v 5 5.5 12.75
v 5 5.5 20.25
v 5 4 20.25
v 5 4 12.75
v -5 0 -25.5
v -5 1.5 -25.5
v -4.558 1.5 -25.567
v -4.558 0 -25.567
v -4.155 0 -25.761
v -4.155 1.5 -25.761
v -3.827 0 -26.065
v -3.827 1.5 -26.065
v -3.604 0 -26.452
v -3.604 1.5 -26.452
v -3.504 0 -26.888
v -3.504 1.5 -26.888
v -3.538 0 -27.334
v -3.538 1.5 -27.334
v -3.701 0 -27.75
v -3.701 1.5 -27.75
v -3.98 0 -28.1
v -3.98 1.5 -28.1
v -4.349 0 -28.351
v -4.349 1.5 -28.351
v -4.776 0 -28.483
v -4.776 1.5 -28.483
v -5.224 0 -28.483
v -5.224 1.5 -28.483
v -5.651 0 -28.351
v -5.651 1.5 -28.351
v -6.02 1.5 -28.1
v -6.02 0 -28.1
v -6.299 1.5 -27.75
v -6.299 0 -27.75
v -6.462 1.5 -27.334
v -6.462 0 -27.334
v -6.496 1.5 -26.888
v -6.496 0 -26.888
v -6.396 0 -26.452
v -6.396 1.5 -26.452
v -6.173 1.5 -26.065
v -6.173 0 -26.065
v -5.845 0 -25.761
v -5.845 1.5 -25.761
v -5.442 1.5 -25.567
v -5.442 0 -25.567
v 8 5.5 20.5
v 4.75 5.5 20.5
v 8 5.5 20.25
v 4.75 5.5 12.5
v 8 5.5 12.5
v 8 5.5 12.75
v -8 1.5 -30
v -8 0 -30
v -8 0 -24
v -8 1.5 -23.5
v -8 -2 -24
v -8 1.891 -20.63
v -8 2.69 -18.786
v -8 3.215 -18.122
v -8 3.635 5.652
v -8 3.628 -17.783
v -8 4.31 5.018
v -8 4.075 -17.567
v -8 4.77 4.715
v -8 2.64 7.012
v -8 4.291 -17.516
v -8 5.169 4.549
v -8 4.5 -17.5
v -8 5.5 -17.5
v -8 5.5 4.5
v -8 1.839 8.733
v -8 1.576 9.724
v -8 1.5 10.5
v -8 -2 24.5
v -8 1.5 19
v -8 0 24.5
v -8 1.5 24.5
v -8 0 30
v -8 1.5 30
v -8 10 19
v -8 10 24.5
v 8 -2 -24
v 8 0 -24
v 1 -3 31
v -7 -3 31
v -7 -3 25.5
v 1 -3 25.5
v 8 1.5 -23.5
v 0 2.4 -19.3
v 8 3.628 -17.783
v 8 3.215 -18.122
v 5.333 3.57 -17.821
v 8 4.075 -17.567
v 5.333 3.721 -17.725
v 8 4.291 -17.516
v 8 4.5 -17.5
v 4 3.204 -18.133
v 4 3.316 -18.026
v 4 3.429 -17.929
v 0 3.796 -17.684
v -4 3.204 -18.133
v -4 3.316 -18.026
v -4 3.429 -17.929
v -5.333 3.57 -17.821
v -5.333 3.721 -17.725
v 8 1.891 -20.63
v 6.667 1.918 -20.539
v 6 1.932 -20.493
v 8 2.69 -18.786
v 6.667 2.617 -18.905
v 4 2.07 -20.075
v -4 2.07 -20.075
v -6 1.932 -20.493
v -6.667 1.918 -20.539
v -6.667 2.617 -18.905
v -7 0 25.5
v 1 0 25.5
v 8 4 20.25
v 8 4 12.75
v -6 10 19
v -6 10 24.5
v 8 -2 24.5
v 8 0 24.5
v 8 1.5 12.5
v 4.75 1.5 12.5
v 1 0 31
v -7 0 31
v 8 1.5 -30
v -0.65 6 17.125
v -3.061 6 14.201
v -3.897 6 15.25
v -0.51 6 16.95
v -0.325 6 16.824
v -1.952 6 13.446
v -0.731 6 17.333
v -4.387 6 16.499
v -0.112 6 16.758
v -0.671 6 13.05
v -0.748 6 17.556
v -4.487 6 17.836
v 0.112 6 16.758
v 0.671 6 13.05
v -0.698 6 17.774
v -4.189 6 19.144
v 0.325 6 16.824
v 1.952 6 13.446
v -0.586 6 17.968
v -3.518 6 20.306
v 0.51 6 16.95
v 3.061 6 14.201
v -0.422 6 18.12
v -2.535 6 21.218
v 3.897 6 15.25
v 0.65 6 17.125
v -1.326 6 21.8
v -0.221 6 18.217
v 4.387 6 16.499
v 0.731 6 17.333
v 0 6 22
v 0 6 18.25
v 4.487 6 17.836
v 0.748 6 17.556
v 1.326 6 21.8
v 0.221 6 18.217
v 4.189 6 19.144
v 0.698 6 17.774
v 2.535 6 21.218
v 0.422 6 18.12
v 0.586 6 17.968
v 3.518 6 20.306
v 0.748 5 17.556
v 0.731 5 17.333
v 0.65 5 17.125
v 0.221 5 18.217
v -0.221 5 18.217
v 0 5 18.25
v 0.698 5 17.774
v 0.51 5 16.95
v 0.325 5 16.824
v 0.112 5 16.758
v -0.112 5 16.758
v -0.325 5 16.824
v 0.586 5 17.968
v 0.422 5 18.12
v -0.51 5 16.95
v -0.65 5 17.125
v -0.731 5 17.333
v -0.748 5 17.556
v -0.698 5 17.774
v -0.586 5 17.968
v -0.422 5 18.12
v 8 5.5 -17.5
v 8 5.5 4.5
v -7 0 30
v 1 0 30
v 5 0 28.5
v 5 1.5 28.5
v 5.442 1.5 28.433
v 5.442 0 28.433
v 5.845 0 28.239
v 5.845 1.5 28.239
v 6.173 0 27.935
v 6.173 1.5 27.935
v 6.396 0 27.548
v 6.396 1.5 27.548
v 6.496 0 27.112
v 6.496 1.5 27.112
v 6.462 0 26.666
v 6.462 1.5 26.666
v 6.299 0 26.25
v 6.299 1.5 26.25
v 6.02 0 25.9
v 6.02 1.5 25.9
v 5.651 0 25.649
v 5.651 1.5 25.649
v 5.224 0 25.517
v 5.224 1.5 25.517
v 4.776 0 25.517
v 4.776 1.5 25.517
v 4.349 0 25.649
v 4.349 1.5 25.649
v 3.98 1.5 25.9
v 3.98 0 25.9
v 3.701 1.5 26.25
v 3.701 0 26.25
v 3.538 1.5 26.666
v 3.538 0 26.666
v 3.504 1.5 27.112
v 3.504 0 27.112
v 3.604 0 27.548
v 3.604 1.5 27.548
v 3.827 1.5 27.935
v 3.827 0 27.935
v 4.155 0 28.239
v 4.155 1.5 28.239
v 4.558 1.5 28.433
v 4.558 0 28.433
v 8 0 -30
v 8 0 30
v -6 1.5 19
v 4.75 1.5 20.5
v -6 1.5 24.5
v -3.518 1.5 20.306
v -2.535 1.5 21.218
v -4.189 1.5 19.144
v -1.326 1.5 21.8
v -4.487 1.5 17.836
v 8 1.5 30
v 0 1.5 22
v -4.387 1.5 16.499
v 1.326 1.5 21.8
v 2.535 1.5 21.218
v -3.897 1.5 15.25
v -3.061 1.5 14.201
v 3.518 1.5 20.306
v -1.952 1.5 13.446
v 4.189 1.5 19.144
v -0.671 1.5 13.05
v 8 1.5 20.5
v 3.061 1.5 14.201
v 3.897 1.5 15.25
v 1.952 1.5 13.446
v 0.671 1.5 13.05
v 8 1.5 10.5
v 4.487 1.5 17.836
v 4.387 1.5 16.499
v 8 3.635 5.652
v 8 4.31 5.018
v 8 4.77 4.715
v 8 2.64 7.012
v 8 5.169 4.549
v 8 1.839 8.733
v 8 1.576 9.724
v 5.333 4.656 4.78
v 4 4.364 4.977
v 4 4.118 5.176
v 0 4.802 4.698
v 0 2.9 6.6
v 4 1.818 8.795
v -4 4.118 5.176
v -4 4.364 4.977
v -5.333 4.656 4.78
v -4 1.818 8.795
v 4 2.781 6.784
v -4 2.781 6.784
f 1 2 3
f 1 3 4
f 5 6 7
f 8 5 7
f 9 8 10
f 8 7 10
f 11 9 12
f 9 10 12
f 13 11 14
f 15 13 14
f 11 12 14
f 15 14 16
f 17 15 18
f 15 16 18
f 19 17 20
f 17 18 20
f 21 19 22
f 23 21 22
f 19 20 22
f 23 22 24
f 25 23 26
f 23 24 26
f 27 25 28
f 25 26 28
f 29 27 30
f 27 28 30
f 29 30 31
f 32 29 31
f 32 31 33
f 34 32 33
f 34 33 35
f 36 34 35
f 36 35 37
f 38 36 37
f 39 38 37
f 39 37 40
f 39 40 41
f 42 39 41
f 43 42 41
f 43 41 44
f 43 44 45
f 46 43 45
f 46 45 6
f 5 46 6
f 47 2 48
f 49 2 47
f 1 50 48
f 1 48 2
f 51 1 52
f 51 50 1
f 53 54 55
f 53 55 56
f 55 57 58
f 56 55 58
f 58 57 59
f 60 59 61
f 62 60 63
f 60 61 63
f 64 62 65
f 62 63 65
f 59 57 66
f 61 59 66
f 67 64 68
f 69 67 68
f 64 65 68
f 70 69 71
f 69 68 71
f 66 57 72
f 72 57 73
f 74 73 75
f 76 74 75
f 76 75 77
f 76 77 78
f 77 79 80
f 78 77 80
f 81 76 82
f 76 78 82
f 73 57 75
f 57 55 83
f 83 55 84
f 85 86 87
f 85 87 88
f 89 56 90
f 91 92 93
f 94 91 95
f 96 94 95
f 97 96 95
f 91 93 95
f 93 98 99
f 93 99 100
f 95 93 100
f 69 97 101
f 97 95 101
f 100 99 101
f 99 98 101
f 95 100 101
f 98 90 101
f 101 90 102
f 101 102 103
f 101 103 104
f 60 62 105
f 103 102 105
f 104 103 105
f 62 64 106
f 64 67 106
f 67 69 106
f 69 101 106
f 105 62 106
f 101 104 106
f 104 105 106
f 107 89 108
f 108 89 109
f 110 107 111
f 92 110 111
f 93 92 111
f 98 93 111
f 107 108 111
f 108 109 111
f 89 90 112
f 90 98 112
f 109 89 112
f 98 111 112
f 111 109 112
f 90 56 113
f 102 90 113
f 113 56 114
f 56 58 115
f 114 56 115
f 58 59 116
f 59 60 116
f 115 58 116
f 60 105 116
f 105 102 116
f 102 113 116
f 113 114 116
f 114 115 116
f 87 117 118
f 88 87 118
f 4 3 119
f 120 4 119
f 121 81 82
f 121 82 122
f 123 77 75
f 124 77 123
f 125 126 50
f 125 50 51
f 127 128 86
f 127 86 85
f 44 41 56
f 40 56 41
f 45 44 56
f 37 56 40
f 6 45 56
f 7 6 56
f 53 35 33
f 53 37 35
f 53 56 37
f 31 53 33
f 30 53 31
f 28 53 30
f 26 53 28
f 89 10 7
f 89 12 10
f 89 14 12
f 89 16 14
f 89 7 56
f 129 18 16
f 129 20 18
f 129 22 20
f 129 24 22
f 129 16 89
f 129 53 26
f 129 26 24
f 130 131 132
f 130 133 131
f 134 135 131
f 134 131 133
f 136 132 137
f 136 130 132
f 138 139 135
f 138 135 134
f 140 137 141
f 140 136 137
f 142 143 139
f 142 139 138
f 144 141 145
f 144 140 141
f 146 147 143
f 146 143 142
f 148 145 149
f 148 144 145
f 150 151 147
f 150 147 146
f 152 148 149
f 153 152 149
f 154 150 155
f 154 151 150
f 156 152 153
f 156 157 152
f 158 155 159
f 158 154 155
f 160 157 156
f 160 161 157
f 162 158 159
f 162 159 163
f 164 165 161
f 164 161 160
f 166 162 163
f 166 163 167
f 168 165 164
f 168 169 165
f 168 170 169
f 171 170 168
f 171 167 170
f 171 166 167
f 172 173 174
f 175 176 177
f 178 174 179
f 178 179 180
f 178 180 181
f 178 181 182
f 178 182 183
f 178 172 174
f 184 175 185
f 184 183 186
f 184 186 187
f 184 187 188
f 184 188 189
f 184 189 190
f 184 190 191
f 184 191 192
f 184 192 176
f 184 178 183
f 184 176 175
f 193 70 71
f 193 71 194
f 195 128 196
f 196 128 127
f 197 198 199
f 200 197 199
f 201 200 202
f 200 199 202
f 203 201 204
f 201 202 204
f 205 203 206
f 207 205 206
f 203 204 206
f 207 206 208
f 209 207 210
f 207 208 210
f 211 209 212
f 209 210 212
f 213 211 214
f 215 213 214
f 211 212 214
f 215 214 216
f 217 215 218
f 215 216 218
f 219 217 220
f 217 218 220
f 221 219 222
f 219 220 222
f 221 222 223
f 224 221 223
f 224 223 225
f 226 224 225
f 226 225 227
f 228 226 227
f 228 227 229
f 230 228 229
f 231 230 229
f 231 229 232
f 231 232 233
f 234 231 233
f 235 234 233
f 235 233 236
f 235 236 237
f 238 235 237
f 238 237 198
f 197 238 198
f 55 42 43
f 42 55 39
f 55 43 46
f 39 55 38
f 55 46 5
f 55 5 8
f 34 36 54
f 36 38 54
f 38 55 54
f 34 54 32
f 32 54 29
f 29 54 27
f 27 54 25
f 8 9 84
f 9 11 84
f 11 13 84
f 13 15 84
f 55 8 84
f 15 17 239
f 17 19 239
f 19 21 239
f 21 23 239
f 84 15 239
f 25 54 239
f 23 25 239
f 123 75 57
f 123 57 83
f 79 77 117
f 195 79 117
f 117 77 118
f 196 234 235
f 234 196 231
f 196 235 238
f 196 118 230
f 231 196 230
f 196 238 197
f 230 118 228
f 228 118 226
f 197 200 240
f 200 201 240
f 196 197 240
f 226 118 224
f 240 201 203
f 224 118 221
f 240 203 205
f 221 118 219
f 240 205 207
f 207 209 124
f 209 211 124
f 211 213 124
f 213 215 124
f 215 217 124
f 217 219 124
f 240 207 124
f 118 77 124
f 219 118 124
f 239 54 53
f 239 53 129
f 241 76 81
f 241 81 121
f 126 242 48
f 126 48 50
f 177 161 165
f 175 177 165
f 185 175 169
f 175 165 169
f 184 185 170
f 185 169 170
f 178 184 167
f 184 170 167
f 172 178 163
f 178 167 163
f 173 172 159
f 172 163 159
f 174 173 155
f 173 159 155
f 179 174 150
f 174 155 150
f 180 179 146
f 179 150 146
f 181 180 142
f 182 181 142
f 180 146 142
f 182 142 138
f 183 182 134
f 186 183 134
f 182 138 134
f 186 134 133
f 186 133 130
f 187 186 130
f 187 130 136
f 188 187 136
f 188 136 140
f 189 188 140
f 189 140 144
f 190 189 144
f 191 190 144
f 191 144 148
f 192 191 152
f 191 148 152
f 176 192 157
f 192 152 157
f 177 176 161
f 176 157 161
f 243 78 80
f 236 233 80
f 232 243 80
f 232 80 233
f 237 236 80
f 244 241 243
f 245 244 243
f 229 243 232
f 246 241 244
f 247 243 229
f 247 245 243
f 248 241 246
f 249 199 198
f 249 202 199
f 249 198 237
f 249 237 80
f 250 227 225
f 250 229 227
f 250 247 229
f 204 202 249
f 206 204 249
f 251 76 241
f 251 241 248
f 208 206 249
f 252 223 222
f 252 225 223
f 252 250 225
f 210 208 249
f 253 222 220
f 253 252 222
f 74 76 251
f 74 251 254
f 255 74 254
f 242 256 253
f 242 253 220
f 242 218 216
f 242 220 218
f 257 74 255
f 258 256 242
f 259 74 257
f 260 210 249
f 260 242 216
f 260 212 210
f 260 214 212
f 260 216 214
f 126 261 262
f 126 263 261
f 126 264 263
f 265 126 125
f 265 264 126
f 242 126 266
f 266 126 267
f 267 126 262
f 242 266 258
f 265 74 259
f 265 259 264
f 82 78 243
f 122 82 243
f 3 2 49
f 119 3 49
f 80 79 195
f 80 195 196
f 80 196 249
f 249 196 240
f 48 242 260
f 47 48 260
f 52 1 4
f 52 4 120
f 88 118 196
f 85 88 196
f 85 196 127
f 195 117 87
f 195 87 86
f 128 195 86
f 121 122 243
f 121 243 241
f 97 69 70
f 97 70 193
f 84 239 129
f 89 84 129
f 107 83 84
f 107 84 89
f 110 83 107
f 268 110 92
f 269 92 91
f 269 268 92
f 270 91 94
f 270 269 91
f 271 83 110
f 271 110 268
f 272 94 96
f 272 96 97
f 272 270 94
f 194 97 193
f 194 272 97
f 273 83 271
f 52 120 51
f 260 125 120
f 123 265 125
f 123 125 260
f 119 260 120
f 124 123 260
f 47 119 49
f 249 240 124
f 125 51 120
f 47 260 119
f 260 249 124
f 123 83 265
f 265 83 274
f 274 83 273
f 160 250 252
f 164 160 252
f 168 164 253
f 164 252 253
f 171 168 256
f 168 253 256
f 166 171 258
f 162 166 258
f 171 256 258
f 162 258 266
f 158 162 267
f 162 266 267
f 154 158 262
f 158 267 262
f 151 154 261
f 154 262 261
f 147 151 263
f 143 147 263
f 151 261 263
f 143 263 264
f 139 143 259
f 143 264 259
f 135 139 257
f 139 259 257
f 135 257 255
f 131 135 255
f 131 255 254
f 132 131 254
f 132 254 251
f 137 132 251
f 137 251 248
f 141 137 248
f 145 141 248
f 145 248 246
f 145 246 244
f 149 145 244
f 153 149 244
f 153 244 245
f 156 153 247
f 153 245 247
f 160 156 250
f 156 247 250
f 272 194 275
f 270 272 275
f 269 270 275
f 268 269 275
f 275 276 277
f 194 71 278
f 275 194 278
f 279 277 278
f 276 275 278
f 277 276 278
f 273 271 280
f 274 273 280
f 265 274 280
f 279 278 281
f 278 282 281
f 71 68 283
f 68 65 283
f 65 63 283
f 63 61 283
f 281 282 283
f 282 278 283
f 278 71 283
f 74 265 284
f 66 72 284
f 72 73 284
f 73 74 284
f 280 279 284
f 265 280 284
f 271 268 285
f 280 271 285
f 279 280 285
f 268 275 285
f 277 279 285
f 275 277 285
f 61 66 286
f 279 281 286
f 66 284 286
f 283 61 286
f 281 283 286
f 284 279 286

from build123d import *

# Parameters (mm, degrees)
SKETCH1_W           = 16
SKETCH1_H           = 60
BOSS_EXTRUDE1_DEPTH = 1.5
SKETCH5_R           = 1.5
CUT_EXTRUDE1_DEPTH  = 32.084562085
SKETCH8_W           = 16
SKETCH8_H           = 22
BOSS_EXTRUDE2_DEPTH = 4
FILLET1_START       = -8
FILLET1_DEPTH       = 16
FILLET2_START       = -8
FILLET2_DEPTH       = 16
SKETCH12_W          = 3.25
SKETCH12_H          = 8
BOSS_EXTRUDE5_DEPTH = 4
SKETCH15_R          = 4.5
BOSS_EXTRUDE6_DEPTH = 4.5
SKETCH16_W          = 3
SKETCH16_H          = 7.5
CUT_EXTRUDE2_DEPTH  = 1.5
SKETCH17_R          = 0.75
CUT_EXTRUDE3_DEPTH  = 1
SKETCH18_W          = 2
SKETCH18_H          = 5.5
BOSS_EXTRUDE7_DEPTH = 8.5
SKETCH22_W          = 8
SKETCH22_H          = 5.5
BOSS_EXTRUDE8_DEPTH = 3
SKETCH23_W          = 16
SKETCH23_H          = 48.5
BOSS_EXTRUDE9_DEPTH = 2


with BuildPart() as part:
    # Sketch1 → Boss-Extrude1 (new body)
    with BuildSketch(Plane(origin=(0, 0, 0), x_dir=(1, 0, 0), z_dir=(0, 1, 0))):
        Rectangle(SKETCH1_W, SKETCH1_H)
    extrude(amount=BOSS_EXTRUDE1_DEPTH)

    # Sketch5 → Cut-Extrude1 (cut, through all)
    with BuildSketch(Plane(origin=(0, 1.5, 0), x_dir=(1, 0, 0), z_dir=(0, 1, 0))):
        with Locations(Location((-5, 27, 0), (0, 0, 270))):
            Circle(SKETCH5_R)
        with Locations(Location((5, -27, 0), (0, 0, 270))):
            Circle(SKETCH5_R)
    extrude(amount=-CUT_EXTRUDE1_DEPTH, mode=Mode.SUBTRACT)

    # Sketch8 → Boss-Extrude2 (add)
    with BuildSketch(Plane(origin=(0, 1.5, 0), x_dir=(1, 0, 0), z_dir=(0, 1, 0))):
        with Locations((0, 6.5)):
            Rectangle(SKETCH8_W, SKETCH8_H)
    extrude(amount=BOSS_EXTRUDE2_DEPTH)

    # Fillet1: read off the stored shape, not the designer's step
    # Fillet1 outline → Fillet1 (add)
    with BuildSketch(Plane.YZ.offset(FILLET1_START)):
        with BuildLine():
            Line((1.5, -17.5), (1.5, -23.5))
            add(Edge.make_bspline(
                [(1.5, -23.5), (1.5, -17.5), (4.5, -17.5)],
                knots=[0, 0, 0, 1, 1, 1], degree=2, weights=[1, 0.666666667, 1]))
            Line((4.5, -17.5), (1.5, -17.5))
        make_face()
    extrude(amount=FILLET1_DEPTH)

    # Fillet2: read off the stored shape, not the designer's step
    # Fillet2 outline → Fillet2 (add)
    with BuildSketch(Plane.YZ.offset(FILLET2_START)):
        with BuildLine():
            Line((1.5, 4.5), (5.5, 4.5))
            add(Edge.make_bspline(
                [(5.5, 4.5), (1.5, 4.5), (1.5, 10.5)],
                knots=[0, 0, 0, 1, 1, 1], degree=2, weights=[1, 0.428571429, 1]))
            Line((1.5, 10.5), (1.5, 4.5))
        make_face()
    extrude(amount=FILLET2_DEPTH)

    # Sketch12 → Boss-Extrude5 (add)
    with BuildSketch(Plane(origin=(0, 1.5, 0), x_dir=(1, 0, 0), z_dir=(0, 1, 0))):
        with Locations((6.375, -16.5)):
            Rectangle(SKETCH12_W, SKETCH12_H)
    extrude(amount=BOSS_EXTRUDE5_DEPTH)

    # Sketch15 → Boss-Extrude6 (add)
    with BuildSketch(Plane(origin=(0, 1.5, 0), x_dir=(1, 0, 0), z_dir=(0, 1, 0))):
        with Locations(Location((0, -17.5, 0), (0, 0, 270))):
            Circle(SKETCH15_R)
    extrude(amount=BOSS_EXTRUDE6_DEPTH)

    # Sketch16 → Cut-Extrude2 (cut)
    with BuildSketch(Plane(origin=(0, 5.5, 0), x_dir=(1, 0, 0), z_dir=(0, 1, 0))):
        with Locations((6.5, -16.5)):
            Rectangle(SKETCH16_W, SKETCH16_H)
    extrude(amount=-CUT_EXTRUDE2_DEPTH, mode=Mode.SUBTRACT)

    # Sketch17 → Cut-Extrude3 (cut)
    with BuildSketch(Plane(origin=(0, 6, 0), x_dir=(1, 0, 0), z_dir=(0, 1, 0))):
        with Locations(Location((0, -17.5, 0), (0, 0, 270))):
            Circle(SKETCH17_R)
    extrude(amount=-CUT_EXTRUDE3_DEPTH, mode=Mode.SUBTRACT)

    # Sketch18 → Boss-Extrude7 (add)
    with BuildSketch(Plane(origin=(0, 1.5, 0), x_dir=(1, 0, 0), z_dir=(0, 1, 0))):
        with Locations((-7, -21.75)):
            Rectangle(SKETCH18_W, SKETCH18_H)
    extrude(amount=BOSS_EXTRUDE7_DEPTH)

    # Sketch22 → Boss-Extrude8 (add)
    with BuildSketch(Plane.XZ):
        with Locations((-3, 28.25)):
            Rectangle(SKETCH22_W, SKETCH22_H)
    extrude(amount=BOSS_EXTRUDE8_DEPTH)

    # Sketch23 → Boss-Extrude9 (add)
    with BuildSketch(Plane.XZ):
        with Locations((0, 0.25)):
            Rectangle(SKETCH23_W, SKETCH23_H)
    extrude(amount=BOSS_EXTRUDE9_DEPTH)


solid = part.part
